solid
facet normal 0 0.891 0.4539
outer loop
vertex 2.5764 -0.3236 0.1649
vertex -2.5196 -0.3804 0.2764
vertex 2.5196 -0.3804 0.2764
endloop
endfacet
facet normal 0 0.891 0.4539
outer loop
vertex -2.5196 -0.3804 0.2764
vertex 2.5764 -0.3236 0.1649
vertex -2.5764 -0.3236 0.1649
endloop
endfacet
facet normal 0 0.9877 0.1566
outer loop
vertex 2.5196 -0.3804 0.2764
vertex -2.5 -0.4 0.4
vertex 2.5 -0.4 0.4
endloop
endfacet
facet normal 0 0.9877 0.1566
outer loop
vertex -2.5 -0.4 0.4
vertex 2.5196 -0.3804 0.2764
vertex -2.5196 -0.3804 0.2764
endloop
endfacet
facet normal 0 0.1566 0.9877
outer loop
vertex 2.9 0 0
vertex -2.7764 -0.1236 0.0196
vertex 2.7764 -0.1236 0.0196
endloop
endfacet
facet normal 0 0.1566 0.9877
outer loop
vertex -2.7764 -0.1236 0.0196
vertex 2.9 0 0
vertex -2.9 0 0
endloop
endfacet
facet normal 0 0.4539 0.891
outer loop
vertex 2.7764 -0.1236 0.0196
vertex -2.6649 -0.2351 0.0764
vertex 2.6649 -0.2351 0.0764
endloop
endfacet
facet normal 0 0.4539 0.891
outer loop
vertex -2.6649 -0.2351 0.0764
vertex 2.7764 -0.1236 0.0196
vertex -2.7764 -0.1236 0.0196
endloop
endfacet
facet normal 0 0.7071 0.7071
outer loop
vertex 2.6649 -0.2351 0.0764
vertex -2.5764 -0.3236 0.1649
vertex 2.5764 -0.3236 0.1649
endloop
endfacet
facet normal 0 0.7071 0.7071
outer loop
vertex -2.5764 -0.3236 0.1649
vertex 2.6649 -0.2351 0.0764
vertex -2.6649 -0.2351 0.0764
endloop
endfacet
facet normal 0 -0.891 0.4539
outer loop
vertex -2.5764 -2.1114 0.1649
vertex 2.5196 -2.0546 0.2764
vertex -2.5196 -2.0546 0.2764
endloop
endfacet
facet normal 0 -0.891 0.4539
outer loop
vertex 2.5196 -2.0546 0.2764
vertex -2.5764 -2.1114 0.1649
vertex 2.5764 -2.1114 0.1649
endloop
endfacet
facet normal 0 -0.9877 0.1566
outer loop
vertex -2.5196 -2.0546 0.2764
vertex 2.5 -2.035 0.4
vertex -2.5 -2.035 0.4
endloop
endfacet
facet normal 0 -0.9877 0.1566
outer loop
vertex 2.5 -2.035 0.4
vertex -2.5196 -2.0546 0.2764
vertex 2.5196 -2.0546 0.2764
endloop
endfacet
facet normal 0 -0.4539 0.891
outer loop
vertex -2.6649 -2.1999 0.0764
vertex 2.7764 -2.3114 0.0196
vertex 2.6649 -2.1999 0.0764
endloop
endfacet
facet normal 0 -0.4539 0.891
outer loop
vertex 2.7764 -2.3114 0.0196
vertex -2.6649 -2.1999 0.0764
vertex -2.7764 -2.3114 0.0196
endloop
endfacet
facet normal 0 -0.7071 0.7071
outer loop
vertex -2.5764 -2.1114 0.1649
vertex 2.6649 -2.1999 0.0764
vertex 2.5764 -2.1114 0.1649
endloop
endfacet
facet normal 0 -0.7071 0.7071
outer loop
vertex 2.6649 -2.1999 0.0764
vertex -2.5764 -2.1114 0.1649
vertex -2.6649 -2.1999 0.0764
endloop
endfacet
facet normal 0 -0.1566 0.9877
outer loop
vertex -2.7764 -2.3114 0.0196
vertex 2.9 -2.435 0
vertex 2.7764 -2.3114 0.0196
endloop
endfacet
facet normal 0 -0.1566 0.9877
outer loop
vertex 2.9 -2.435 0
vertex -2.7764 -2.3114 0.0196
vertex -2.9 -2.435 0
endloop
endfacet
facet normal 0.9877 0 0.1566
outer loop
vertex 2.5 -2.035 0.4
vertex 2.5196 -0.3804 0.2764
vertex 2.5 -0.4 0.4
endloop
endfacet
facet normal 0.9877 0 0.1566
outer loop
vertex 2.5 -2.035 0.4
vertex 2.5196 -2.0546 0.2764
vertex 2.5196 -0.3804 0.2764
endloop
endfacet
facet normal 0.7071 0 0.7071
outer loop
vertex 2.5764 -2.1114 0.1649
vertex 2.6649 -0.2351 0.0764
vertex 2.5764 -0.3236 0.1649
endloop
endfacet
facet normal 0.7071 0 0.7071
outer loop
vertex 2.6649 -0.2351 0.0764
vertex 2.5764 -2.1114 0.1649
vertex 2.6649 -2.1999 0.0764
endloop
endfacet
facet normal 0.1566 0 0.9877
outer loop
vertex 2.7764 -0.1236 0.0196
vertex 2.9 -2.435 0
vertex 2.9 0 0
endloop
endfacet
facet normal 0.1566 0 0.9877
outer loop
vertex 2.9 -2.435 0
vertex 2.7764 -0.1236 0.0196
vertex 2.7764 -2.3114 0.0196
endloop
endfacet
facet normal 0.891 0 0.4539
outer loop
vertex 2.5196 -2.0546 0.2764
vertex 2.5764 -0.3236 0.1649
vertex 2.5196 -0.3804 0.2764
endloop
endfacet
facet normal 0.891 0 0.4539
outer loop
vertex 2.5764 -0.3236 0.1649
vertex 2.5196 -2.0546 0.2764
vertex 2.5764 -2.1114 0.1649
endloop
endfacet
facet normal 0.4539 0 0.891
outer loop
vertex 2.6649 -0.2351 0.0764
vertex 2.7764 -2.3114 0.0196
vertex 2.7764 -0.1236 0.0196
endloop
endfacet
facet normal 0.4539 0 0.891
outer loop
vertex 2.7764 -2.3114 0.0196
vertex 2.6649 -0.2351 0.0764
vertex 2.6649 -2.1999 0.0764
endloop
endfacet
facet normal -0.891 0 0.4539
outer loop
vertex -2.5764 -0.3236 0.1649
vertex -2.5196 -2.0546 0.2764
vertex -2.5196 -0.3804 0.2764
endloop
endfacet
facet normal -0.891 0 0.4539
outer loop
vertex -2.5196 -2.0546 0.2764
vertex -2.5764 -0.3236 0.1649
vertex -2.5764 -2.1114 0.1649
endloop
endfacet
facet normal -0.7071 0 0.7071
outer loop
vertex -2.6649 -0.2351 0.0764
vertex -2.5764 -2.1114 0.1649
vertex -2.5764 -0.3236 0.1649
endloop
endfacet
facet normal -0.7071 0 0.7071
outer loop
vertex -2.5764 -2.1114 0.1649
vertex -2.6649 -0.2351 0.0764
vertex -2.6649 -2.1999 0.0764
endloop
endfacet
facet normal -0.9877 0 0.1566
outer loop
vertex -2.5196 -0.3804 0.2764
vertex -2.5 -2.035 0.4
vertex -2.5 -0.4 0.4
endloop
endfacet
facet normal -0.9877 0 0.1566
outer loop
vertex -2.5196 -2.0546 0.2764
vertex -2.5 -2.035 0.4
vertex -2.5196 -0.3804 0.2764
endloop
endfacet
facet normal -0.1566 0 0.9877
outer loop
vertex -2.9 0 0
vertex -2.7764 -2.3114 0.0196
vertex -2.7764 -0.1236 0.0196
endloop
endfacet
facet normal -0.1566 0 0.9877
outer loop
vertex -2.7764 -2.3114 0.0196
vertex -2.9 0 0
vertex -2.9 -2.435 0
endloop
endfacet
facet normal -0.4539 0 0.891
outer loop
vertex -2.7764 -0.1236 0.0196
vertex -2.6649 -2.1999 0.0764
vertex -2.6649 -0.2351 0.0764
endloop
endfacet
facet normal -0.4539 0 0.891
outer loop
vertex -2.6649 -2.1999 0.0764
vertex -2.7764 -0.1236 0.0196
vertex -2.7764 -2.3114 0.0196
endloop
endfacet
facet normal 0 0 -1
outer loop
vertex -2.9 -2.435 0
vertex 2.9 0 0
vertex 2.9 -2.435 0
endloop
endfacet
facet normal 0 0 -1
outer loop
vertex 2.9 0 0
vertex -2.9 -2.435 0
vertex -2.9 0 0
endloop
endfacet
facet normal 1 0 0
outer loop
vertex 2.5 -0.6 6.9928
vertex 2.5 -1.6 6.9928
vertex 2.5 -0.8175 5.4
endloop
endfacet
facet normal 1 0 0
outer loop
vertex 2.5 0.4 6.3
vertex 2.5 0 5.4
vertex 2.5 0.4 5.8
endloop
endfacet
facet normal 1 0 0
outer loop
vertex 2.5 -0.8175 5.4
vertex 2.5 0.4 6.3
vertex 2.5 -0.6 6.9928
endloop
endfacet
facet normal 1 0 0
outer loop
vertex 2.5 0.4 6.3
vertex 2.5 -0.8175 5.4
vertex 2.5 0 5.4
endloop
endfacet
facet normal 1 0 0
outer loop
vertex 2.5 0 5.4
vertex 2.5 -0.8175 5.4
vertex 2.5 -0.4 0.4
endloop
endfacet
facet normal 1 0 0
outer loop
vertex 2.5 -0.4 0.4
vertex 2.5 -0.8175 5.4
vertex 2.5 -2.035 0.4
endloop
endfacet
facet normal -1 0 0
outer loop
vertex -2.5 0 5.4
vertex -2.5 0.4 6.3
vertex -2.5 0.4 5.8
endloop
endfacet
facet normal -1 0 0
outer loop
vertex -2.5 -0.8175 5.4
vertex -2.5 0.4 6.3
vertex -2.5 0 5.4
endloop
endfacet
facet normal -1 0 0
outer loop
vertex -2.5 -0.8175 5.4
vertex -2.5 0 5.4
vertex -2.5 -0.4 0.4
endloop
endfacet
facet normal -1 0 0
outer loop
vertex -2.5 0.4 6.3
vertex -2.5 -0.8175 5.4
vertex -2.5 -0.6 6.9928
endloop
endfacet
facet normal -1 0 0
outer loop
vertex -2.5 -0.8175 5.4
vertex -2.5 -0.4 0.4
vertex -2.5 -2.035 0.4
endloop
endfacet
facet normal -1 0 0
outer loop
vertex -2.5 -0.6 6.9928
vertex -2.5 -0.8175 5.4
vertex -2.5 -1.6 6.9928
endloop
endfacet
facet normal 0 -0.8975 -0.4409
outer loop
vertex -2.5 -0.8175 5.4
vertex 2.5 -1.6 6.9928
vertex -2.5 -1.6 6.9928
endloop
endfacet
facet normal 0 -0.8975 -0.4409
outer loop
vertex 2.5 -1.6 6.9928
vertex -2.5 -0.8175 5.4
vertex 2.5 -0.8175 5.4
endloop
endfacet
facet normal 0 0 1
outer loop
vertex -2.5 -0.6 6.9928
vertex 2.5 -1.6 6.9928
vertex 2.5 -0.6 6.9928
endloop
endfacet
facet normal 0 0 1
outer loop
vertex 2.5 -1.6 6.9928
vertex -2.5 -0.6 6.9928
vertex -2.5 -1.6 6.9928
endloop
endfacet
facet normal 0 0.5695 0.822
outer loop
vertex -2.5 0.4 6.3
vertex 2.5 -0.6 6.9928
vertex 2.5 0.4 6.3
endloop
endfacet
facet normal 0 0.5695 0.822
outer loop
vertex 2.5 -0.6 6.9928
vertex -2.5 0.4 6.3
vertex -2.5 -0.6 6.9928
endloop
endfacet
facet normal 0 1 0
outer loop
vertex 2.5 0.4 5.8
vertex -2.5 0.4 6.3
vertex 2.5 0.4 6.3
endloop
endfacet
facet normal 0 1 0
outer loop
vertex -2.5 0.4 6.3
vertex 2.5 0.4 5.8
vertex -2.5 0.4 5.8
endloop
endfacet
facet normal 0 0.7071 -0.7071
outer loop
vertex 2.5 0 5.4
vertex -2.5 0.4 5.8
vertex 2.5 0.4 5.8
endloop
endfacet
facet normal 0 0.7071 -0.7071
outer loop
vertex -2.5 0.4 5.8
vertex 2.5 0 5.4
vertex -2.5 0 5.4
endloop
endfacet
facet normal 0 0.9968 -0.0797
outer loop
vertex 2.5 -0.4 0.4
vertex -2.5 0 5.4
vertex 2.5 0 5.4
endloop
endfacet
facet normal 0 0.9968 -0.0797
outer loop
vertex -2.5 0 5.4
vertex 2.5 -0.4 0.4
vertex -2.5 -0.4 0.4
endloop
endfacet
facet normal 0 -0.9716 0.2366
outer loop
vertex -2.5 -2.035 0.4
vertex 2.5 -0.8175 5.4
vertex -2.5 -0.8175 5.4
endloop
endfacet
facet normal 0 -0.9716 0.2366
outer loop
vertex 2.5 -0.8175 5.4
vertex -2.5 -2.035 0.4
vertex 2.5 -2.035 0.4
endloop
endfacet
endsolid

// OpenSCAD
// file: mirror_copy.scad
module mirror_copy(vector=[1,0,0]){
    children();
    mirror(vector) children();
}
// main file
use<mirror_copy.scad>

//********************* variables ***********************

eps=0.5*6/100;//Elongation at break of PLA=6%
Epm=0.06;   //max permissible strain
SF=2;       //safety factor
t=1.5;  //wallyhickness
l=10;  //arm length(x)
w=5;    //arm width
f=1;    //factor
help=false; //help message
angle=30;   //taper angle
y=1;
E=Epm/SF;   //design strain

//********************* calculated variables ***********************


//********************* functions ***********************

//calculates the root thickness required(h)
function h(E,l,y)=1.09*E*pow(l,2)/y;
function hArm(la=10,y=1,root=3,angle=30)=[[0,0],[la,0],[la,y],[la+y,y],[la+y+(y+root/4)/tan(angle),-root/4],[la,-root/2],[0,-root]];
function y(K2,eps,la,r2)=1.64*K2*(eps*pow(la,2))/(r2);
//finger(l,root,y,xland,angle,yland)
//creates a path for the shape of the finger
function finger(l=5,root=5,y=1,xLand=1,angle=30,yLand=1,fillet=0.4)=
    [[0,0],[l,fillet],[l+y,y+fillet],
    [l+y+xLand,y+fillet],[l+y+xLand+y/tan(angle),-y/2],
    [l+y+xLand+y/tan(angle),-(yLand+y/2)],[l,-root/2+fillet],[0,-root]];


//Example:
hook();
//roundHook();

module hook(
    eps=0.5*6/100,//Elongation at break of PLA=6%
    Epm=0.06,   //max permissible strain
    SF=2,       //safety factor
    t=1.5,  //wallyhickness
    l=5,  //arm length(x)
    w=5,    //arm width
    f=1,    //factor
    help=false, //help message
    angle=30,   //taper angle
    y=0.5,
    E=Epm/SF   //design strain
){
    root=h(E,l,y);
    fillet=max(root/5,0.4);

    translate([w/2,-fillet,fillet])rotate([0,-90,0])
    linear_extrude(w)polygon(finger(l,root,fillet,y,angle));
    translate([0,-(root/2+fillet),0])
    difference(){
        translate([0,0,fillet/2])
        cube([w+2*fillet,root+2*fillet,fillet],center=true); //base
        //add fillets to root to reduce SCF
        mirror_copy([0,1,0])translate([0,root/2+fillet,fillet])
        rotate([0,90,0])cylinder(h=w+2*fillet,r=fillet,$fn=20,center=true);
        mirror_copy([1,0,0])translate([w/2+fillet,0,fillet])
        rotate([90,0,0])cylinder(h=root+2*fillet,r=fillet,$fn=20,
        center=true);
    }
}

module roundHook(lobes=6,l=10,angle=30,r2=5,K=2){
    echo(y(K,eps,l,r2));
    theta=180/lobes;
    for(i=[0:lobes-1])
    rotate([0,0,2*i*theta])rotate_extrude(angle=angle)
    translate([r2,0,0])mirror([1,-1,0])polygon(finger(y=y(K,eps,l,r2)));
}
